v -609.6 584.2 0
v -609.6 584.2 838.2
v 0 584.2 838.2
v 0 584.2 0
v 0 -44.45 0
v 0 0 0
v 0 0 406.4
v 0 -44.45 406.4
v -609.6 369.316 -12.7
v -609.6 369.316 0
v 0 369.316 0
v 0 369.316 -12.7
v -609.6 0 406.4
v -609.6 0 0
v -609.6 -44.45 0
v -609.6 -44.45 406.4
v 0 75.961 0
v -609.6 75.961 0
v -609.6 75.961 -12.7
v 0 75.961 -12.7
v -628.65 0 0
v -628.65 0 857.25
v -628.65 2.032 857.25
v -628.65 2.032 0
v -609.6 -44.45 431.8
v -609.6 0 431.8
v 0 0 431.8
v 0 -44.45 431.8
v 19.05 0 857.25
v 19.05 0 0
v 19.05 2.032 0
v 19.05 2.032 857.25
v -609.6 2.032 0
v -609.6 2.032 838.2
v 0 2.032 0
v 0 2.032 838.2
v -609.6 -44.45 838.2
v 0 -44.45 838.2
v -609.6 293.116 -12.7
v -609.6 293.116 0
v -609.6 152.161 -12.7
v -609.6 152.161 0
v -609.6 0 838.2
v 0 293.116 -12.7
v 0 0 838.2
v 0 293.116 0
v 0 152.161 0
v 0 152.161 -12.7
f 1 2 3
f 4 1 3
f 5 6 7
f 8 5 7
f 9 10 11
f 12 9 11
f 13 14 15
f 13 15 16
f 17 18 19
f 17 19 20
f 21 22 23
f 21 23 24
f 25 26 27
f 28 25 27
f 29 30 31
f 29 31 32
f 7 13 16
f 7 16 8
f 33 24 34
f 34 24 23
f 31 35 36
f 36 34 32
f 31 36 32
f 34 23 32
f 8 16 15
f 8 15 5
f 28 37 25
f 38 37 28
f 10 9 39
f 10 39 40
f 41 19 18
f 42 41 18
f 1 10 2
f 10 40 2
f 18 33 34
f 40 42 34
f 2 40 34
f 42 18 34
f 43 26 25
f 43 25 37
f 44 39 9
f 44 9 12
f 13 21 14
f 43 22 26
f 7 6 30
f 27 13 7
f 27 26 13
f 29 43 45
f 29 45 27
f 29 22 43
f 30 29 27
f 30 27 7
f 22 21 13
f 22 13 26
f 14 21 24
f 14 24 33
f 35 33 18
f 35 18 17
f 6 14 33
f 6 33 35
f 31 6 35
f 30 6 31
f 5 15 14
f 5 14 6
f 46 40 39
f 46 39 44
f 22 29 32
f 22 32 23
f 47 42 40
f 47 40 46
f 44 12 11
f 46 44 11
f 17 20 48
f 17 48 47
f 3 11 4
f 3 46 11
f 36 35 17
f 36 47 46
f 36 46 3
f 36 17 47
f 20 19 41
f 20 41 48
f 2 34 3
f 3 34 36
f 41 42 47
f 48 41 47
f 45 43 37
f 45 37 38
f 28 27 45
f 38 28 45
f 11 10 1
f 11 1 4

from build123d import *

# Parameters (mm, degrees)
F0_W     = 609.6
F0_H     = 838.2
F1_DEPTH = 584.2
F2_DEPTH = 2.032
F3_W     = 609.6
F3_H     = 406.4
F4_DEPTH = 44.45
F5_W     = 609.6
F5_H     = 76.2
F6_DEPTH = 12.7


with BuildPart() as f1:
    # F0 (on Front) → F1 (new body)
    with BuildSketch(Plane.XZ):
        with Locations((-304.8, 419.1)):
            Rectangle(F0_W, F0_H)
    extrude(amount=-F1_DEPTH)

    # F0 (on Front) → F2 (join)
    with BuildSketch(Plane.XZ):
        Polygon((0, 838.2), (0, 0), (19.05, 0), (19.05, 857.25), (-628.65, 857.25), (-628.65, 0), (-609.6, 0), (-609.6, 838.2), align=None)
    extrude(amount=-F2_DEPTH)

    # F3 (on face) → F4 (join)
    with BuildSketch(Plane.XZ):
        with Locations((-304.8, 635)):
            Rectangle(F3_W, F3_H)
        with Locations((-304.8, 203.2)):
            Rectangle(F3_W, F3_H)
    extrude(amount=F4_DEPTH)

    # F5 (on face) → F6 (join)
    with BuildSketch(Plane(origin=(0, 0, 0), x_dir=(1, 0, 0), z_dir=(0, 0, -1))):
        with Locations((-304.8, -114.060853)):
            Rectangle(F5_W, F5_H)
        with Locations((-304.8, -331.216)):
            Rectangle(F5_W, F5_H)
    extrude(amount=F6_DEPTH)


solid = f1.part
